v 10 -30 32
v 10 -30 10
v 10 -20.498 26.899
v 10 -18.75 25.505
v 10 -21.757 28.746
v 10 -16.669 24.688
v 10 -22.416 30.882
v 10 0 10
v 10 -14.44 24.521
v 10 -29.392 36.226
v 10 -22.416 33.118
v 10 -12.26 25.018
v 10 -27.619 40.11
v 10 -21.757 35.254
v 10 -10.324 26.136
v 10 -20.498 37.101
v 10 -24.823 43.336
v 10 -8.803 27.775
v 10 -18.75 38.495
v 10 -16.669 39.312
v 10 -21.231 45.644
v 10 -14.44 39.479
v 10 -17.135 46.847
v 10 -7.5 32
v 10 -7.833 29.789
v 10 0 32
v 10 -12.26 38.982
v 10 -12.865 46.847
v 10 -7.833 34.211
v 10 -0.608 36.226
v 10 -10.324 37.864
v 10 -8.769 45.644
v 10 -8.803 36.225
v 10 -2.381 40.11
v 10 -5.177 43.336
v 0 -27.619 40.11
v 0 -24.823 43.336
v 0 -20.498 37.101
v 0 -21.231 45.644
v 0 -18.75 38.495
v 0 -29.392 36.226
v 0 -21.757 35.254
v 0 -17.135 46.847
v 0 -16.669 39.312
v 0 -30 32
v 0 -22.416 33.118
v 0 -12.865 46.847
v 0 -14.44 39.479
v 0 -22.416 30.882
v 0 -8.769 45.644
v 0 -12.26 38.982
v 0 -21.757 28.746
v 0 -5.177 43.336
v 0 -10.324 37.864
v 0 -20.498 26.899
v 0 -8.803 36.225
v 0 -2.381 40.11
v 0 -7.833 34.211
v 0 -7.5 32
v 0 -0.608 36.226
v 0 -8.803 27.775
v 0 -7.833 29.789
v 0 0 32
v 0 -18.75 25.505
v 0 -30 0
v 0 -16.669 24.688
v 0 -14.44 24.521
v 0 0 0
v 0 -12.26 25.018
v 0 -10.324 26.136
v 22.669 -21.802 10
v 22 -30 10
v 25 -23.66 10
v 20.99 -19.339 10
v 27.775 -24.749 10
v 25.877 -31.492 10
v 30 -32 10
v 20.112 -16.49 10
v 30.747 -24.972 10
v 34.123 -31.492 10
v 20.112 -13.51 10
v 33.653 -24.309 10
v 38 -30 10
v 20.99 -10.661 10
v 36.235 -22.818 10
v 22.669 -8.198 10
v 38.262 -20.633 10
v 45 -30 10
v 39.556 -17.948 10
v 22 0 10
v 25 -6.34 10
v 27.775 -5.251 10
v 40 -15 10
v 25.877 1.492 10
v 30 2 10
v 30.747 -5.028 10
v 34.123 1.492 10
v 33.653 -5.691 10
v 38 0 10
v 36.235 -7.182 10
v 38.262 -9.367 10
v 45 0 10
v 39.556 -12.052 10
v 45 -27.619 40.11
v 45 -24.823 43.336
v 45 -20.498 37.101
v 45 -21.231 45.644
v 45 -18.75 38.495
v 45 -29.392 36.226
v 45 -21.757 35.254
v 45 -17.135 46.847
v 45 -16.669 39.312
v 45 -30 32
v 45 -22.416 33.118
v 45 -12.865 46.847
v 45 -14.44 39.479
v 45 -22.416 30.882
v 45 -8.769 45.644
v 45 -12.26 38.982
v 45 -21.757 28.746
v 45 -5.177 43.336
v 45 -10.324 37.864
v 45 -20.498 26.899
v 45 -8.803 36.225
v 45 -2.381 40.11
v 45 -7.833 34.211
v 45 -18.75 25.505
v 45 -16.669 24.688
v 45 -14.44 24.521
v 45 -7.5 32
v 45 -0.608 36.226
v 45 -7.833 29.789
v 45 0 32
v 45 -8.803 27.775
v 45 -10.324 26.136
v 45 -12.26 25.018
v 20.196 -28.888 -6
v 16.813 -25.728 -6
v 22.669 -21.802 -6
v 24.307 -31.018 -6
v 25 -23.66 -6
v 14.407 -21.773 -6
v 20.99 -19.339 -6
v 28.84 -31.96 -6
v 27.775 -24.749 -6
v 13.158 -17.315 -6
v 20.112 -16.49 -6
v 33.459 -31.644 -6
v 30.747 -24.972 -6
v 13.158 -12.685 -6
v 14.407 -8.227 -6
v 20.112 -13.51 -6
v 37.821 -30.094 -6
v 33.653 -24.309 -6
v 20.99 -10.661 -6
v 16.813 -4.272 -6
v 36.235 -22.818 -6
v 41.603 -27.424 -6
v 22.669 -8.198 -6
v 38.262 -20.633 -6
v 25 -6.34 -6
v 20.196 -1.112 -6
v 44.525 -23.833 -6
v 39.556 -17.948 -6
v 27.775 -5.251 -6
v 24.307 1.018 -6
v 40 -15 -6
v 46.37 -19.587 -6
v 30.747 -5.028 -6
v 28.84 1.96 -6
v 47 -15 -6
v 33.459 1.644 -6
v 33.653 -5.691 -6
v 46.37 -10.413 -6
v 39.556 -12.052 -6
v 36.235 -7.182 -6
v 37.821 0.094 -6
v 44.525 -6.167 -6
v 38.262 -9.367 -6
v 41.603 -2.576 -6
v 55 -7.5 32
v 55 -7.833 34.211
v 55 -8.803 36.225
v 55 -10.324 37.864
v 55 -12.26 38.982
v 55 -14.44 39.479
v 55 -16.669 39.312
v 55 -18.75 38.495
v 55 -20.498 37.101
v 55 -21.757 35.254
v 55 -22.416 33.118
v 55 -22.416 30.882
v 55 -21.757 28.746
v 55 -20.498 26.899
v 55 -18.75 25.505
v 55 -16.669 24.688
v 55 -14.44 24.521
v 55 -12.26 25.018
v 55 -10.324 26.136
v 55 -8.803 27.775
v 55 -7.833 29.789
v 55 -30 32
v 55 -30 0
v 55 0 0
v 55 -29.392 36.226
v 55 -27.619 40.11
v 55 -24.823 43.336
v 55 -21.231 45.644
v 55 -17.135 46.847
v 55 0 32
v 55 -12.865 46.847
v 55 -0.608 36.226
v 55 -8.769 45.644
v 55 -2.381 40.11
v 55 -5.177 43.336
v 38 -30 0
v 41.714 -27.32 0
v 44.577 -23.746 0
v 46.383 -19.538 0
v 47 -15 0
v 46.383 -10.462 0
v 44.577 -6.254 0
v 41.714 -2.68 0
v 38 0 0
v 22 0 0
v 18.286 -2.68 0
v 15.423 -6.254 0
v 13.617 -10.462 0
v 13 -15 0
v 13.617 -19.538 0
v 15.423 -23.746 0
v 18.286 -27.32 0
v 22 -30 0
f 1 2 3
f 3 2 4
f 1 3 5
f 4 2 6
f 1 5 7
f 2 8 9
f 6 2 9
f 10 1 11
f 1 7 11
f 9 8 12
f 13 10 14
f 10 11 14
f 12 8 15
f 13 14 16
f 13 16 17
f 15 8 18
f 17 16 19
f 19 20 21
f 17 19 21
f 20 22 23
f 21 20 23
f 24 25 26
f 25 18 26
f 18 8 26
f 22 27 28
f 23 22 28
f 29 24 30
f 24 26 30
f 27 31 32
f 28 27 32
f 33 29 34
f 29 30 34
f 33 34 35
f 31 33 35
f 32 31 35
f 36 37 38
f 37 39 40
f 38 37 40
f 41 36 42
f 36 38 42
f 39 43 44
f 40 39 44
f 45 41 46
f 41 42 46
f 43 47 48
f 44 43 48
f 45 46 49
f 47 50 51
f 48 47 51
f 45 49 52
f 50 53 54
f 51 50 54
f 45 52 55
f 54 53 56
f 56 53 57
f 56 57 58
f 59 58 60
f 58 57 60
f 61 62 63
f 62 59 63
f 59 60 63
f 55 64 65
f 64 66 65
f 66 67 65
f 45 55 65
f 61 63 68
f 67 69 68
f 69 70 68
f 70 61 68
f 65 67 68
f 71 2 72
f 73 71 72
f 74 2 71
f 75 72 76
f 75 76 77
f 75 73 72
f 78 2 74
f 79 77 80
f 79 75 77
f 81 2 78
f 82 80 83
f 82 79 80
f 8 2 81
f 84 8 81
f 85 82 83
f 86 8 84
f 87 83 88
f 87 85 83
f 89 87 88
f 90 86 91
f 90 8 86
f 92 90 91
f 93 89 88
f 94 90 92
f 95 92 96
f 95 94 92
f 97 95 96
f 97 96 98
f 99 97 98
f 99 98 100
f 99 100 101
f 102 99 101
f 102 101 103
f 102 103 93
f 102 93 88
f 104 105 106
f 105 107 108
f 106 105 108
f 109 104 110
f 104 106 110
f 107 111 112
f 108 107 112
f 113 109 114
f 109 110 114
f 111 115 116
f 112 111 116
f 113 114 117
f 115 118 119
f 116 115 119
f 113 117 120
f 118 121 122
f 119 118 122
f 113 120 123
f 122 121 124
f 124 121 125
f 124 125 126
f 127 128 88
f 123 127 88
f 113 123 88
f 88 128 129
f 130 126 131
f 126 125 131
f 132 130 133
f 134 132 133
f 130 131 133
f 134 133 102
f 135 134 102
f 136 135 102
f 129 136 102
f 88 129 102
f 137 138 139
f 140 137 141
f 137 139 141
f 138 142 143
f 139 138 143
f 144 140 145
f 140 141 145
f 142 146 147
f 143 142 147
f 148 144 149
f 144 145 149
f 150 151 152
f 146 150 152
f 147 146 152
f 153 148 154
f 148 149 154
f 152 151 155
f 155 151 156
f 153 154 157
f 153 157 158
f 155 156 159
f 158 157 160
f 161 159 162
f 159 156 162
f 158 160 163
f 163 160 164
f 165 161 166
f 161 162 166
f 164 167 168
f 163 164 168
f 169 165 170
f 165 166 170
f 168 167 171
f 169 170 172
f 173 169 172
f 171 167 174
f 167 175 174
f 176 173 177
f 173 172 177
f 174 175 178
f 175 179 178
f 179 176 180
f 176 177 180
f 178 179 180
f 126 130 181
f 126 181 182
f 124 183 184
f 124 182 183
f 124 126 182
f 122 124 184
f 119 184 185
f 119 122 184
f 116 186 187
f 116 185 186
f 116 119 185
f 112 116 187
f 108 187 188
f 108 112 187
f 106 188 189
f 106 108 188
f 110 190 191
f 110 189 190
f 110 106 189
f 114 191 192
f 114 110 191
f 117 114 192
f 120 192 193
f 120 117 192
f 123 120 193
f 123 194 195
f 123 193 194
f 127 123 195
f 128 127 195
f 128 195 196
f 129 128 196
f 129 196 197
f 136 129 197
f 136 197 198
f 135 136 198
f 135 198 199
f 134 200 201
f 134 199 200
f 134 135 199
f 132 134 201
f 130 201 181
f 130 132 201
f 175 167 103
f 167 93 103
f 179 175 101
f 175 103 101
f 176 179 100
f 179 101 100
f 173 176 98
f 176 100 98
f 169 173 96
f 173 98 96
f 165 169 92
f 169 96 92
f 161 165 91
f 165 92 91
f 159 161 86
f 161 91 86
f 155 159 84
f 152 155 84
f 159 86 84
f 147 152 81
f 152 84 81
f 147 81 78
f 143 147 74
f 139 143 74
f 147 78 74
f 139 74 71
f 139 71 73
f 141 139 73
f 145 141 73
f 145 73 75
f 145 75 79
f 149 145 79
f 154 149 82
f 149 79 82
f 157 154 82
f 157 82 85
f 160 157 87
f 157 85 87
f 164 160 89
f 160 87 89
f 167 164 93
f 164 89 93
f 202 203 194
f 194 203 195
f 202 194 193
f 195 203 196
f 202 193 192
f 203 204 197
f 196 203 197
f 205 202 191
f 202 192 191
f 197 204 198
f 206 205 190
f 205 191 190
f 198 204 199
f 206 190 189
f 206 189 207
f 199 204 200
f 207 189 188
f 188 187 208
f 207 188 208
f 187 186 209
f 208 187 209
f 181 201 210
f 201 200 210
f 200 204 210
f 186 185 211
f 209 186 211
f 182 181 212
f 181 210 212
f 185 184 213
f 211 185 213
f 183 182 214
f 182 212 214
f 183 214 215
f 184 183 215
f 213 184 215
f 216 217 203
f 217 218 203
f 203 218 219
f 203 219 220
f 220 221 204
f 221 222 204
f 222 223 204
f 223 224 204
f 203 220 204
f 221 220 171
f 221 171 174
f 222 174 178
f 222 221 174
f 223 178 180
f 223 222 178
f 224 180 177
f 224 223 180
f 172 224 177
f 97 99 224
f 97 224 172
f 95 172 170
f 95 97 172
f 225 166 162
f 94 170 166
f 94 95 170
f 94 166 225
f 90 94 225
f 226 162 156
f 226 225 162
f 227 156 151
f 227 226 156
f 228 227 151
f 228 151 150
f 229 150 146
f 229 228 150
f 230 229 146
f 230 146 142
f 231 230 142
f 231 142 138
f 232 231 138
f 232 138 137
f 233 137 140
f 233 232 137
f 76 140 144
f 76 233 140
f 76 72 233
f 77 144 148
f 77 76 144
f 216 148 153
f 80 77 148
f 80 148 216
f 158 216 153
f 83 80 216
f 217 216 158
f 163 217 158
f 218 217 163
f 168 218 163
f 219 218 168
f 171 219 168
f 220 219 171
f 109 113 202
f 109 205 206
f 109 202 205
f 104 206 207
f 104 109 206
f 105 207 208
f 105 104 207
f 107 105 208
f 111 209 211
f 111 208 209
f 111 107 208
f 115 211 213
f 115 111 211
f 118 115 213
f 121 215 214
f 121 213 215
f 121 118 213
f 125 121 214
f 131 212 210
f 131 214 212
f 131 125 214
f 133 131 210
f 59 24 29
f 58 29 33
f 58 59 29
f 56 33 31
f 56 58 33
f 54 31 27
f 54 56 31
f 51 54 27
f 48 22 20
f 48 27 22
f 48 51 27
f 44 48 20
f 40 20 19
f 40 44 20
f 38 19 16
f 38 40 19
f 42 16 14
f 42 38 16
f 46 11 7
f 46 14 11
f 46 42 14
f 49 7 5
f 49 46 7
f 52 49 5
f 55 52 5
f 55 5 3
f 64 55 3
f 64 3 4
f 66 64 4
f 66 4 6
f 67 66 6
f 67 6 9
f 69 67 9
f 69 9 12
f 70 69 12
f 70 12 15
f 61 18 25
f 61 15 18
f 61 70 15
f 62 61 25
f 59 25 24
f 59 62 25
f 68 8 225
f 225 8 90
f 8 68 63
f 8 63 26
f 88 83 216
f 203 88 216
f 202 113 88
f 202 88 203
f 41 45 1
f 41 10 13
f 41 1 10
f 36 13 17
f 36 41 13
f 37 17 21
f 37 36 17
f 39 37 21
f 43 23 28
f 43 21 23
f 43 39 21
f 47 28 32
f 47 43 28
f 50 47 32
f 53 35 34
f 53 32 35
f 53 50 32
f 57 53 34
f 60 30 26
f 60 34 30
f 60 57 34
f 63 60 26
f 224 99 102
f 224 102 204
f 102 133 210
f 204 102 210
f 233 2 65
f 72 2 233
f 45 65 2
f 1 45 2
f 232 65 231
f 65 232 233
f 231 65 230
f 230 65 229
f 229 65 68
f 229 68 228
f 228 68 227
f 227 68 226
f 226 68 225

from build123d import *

# Parameters (mm, degrees)
F1_DEPTH      = 30
F2_R          = 17
F3_DEPTH      = 10
F3_DEPTH_BACK = 6
F4_R          = 10
F5_DEPTH      = 25
F5_DEPTH_BACK = 25
F6_R          = 7.5
F7_DEPTH      = 70


with BuildPart() as f1:
    # F0 (on Front) → F1 (new body)
    with BuildSketch(Plane.XZ):
        Polygon((0, 47), (0, 0), (55, 0), (55, 47), (45, 47), (45, 10), (10, 10), (10, 47), align=None)
    extrude(amount=F1_DEPTH)

    # F2 (on Top) → F3 (join, two sides)
    with BuildSketch(Plane.XY) as f3_sk:
        with Locations((30, -15)):
            Circle(F2_R)
    extrude(amount=F3_DEPTH)
    extrude(f3_sk.sketch, amount=-F3_DEPTH_BACK)

    # F4 (on Top) → F5 (cut, two sides)
    with BuildSketch(Plane.XY) as f5_sk:
        with Locations((30, -15)):
            Circle(F4_R)
    extrude(amount=-F5_DEPTH, mode=Mode.SUBTRACT)
    extrude(f5_sk.sketch, amount=F5_DEPTH_BACK, mode=Mode.SUBTRACT)

    # F6 (on Right) → F7 (cut)
    with BuildSketch(Plane.YZ):
        with BuildLine():
            ThreePointArc((-30, 32), (-25.6066017178, 42.6066017178), (-15, 47))
            Line((-15, 47), (-30, 47))
            Line((-30, 47), (-30, 32))
        make_face()
        with BuildLine():
            ThreePointArc((-15, 47), (-4.3933982822, 42.6066017178), (0, 32))
            Line((0, 32), (0, 47))
            Line((0, 47), (-15, 47))
        make_face()
        with Locations((-15, 32)):
            Circle(F6_R)
    extrude(amount=F7_DEPTH, mode=Mode.SUBTRACT)


solid = f1.part
